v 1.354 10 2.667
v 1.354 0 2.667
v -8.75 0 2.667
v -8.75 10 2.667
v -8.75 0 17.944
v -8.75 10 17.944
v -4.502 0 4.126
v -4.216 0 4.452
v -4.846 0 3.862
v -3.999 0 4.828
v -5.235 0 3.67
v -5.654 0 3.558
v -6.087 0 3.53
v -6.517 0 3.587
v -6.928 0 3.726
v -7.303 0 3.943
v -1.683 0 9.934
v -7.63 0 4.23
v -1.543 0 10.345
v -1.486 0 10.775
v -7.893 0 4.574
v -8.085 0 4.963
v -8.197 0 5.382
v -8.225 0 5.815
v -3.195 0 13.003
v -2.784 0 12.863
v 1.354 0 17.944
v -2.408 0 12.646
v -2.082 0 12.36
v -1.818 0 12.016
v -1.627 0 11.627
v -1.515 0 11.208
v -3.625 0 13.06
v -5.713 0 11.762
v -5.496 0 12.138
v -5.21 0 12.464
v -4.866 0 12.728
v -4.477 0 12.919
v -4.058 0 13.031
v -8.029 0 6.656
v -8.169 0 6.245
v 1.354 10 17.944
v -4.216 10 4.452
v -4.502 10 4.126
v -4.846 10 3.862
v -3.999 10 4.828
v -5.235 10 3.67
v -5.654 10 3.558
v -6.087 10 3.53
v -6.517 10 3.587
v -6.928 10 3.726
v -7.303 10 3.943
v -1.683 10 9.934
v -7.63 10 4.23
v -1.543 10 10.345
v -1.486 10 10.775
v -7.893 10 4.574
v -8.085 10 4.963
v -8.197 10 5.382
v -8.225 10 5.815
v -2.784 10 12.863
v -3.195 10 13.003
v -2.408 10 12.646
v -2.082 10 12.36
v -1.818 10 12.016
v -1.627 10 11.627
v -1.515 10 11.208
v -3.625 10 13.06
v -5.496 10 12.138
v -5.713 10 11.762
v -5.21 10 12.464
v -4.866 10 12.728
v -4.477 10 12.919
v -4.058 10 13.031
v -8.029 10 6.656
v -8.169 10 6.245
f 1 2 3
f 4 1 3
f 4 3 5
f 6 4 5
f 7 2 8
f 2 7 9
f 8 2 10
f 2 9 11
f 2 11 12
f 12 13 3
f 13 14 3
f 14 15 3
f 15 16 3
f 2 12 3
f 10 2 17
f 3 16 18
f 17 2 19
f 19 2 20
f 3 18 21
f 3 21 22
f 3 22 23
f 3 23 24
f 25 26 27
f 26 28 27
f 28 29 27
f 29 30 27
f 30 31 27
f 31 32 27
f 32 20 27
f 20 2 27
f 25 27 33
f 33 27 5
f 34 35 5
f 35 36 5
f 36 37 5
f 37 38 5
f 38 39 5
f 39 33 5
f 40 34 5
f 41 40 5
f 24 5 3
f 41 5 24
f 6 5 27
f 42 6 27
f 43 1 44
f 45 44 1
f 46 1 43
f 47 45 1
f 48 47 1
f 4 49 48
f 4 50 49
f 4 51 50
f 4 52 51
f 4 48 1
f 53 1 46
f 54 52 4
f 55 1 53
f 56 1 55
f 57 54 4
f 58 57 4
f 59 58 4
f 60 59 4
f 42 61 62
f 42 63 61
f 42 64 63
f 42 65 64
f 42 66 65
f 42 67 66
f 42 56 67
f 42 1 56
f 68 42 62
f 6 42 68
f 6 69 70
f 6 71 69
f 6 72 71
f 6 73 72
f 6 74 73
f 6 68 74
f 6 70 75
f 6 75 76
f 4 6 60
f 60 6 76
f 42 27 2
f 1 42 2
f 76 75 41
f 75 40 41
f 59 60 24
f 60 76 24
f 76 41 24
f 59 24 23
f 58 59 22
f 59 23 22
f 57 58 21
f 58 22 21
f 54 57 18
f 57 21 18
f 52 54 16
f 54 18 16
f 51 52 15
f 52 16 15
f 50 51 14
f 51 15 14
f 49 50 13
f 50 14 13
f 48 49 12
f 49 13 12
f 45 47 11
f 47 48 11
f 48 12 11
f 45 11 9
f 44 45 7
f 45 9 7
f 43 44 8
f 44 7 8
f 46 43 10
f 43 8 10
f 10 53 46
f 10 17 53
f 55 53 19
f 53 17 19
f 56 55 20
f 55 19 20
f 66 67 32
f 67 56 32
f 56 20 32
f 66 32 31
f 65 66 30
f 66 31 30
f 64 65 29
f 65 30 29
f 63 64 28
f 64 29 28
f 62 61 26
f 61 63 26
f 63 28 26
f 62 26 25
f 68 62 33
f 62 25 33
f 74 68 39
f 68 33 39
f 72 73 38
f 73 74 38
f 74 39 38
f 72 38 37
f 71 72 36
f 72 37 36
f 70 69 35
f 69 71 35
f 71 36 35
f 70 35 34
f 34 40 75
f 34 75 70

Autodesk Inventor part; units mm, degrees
ref_plane "YZ Plane" through (0, 0, 0) normal (1, 0, 0) x (0, 1, 0)
ref_plane "XZ Plane" through (0, 0, 0) normal (0, 1, 0) x (-1, 0, 0)
ref_plane "XY Plane" through (0, 0, 0) normal (0, 0, 1) x (1, 0, 0)
sketch "Sketch1" plane through (0, 0, 0) normal (0, 1, 0) x (-1, 0, 0)
  line L0 (8.7498, 17.9442) -> (-1.3539, 17.9442)
  line L1 (-1.3539, 17.9442) -> (-1.3539, 2.6674)
  line L2 (-1.3539, 2.6674) -> (8.7498, 2.6674)
  line L3 (8.7498, 2.6674) -> (8.7498, 17.9442)
  line L4 (6.0139, 5.7417) -> (3.698, 10.8481) construction
  line L5 (8.0291, 6.6557) -> (5.7132, 11.7621)
  line L6 (1.6827, 9.9341) -> (3.9986, 4.8277)
  arc A0 (3.9986, 4.8277) -> (8.0291, 6.6557) centre (6.0139, 5.7417) ccw
  arc A1 (5.7132, 11.7621) -> (1.6827, 9.9341) centre (3.698, 10.8481) ccw
  point P0 (0, 0)
  point P1 (4.8559, 8.2949)
extrude "Extrusion1" add sketch "Sketch1" along normal blind 10
